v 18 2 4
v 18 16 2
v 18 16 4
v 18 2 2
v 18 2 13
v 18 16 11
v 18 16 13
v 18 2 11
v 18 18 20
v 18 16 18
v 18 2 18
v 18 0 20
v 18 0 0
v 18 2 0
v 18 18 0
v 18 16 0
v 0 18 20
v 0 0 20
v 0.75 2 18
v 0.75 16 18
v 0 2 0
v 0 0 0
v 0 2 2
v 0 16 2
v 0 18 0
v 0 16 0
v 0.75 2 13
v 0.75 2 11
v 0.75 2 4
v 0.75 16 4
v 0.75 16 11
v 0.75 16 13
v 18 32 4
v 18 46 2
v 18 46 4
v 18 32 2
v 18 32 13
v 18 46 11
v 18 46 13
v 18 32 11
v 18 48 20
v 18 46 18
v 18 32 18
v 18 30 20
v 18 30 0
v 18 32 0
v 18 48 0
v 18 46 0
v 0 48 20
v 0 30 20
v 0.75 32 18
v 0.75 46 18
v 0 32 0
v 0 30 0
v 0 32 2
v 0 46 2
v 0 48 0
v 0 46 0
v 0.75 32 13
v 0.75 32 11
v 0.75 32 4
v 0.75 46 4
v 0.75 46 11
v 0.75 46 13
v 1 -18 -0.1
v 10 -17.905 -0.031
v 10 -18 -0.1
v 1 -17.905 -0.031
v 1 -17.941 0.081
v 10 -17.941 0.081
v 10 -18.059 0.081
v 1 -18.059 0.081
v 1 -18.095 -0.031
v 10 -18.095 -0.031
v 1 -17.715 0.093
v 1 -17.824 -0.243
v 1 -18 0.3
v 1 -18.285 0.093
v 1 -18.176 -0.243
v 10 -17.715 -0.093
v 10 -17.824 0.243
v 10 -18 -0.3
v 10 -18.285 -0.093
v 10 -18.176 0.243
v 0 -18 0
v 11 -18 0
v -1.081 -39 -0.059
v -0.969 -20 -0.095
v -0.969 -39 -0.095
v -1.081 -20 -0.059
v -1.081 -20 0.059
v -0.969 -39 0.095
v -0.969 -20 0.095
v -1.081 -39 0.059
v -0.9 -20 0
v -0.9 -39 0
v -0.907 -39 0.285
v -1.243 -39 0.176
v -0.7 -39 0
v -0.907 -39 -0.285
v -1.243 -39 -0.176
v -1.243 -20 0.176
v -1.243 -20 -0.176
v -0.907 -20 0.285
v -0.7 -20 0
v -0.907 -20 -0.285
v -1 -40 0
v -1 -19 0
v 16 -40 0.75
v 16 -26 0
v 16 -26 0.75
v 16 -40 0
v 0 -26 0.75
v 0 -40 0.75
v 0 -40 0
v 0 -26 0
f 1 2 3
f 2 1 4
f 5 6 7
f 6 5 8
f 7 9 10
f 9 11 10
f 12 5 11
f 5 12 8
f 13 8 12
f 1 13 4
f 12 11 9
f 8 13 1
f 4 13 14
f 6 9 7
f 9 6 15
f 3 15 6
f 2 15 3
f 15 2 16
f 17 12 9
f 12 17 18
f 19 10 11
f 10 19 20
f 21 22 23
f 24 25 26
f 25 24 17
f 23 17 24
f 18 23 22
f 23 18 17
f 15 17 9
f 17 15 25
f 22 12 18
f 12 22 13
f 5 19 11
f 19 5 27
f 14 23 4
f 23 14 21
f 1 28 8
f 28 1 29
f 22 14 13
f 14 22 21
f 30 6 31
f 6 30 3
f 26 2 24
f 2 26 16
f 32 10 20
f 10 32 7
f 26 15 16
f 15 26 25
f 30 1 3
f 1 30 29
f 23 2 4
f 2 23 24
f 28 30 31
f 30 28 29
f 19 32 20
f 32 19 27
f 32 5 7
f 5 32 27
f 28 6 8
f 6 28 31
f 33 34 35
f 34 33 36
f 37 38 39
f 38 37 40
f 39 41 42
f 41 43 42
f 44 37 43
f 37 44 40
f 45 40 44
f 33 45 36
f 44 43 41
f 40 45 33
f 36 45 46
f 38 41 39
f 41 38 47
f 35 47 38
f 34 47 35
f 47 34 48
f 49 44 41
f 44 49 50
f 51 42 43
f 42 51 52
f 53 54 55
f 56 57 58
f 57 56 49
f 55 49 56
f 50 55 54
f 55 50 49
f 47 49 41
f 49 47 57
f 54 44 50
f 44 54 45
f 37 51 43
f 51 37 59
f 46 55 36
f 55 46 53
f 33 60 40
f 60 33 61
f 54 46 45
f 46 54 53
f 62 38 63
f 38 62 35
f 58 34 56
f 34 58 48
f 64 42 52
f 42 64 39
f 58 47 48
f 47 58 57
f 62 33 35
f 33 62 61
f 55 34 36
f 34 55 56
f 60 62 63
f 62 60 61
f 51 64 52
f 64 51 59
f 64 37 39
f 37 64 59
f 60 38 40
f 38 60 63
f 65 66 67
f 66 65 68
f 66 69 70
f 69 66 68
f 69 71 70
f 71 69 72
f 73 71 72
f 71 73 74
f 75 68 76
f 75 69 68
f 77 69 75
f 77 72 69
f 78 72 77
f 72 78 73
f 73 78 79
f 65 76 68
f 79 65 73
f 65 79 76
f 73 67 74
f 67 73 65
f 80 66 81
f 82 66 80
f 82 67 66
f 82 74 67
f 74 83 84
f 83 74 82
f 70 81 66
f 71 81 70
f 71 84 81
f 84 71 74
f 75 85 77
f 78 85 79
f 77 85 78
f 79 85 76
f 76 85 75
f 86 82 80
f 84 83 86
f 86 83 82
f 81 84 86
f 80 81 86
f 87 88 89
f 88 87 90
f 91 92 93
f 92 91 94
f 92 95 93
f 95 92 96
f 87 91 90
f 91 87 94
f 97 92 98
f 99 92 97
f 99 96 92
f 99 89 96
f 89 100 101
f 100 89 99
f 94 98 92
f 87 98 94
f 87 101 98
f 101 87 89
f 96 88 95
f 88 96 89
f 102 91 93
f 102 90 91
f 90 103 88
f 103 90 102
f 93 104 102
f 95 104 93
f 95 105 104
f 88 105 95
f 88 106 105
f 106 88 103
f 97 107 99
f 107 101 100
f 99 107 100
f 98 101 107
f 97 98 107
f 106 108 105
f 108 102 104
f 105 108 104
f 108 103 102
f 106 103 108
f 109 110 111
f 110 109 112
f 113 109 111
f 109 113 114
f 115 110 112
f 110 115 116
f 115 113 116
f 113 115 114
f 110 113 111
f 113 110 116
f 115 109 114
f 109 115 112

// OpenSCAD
// file: ../lib/common.scad
//--------------------------------------------------------------------------------------------------
// Module Prism
//--------------------------------------------------------------------------------------------------
module prism(z, y, x)
{
    rotate([0, 90, 0])
    {
        polyhedron(
                points=[[0,0,0], [x,0,0], [x,y,0], [0,y,0], [0,y,z], [x,y,z]],
                faces=[[0,1,2,3],[5,4,3,2],[0,4,5,1],[0,3,4],[5,2,1]]);
    }
    
}

//--------------------------------------------------------------------------------------------------
// Module Side panel
//--------------------------------------------------------------------------------------------------
module rect_cut(x, y, z, dx, dy)
{
    // Top panel
    translate([0, dy, 0])
    {
        cube([x, y - dy, z]);
    };

    // Left bottom panel
    translate([0, 0, 0])
    {
        cube([dx, dy, z]);
    };

    // Triangle
    translate([dx, 0, 0])
    {
        rotate([0, 0, 0])
        {
            prism(x - dx, dy, -z);
        }
    };
}

//--------------------------------------------------------------------------------------------------
// X dimensional arrow
//--------------------------------------------------------------------------------------------------
module arrow_x(l)
{
    line_w = 0.1;
    arrow_w = 1;
    arrow_h = 0.3;

    // Line
    translate([l / 2, 0, 0])
    {
        rotate([0, 90, 0])
        {
            color([0.4, 0.4, 0.4])
            cylinder(l - arrow_w * 2, line_w, line_w, true);
        }
    }

    // Left arrow
    translate([arrow_w, 0, 0])
    {
        rotate([0, 270, 0])
        {
            color([0.4, 0.4, 0.4])
            cylinder(arrow_w, arrow_h, 0, false);
        }
    }

    // Right arrow
    translate([l - arrow_w, 0, 0])
    {
        rotate([0, 90, 0])
        {
            color([0.4, 0.4, 0.4])
            cylinder(arrow_w, arrow_h, 0, false);
        }
    }

    // Text
    translate([l/3, 0.5, 0])
    {
        color([0.4, 0.4, 0.4])
        text(str(l), size=1);
    }
}

//--------------------------------------------------------------------------------------------------
// Y dimensional arrow
//--------------------------------------------------------------------------------------------------
module arrow_y(l)
{
    line_w = 0.1;
    arrow_w = 1;
    arrow_h = 0.3;

    // Line
    translate([0, l / 2, 0])
    {
        rotate([90, 0, 00])
        {
            color([0.4, 0.4, 0.4])
            cylinder(l - arrow_w * 2, line_w, line_w, true);
        }
    }

    // Left arrow
    translate([0 ,arrow_w, 0])
    {
        rotate([90, 0, 0])
        {
            color([0.4, 0.4, 0.4])
            cylinder(arrow_w, arrow_h, 0, false);
        }
    }

    // Right arrow
    translate([0, l - arrow_w, 0])
    {
        rotate([270, 0, 0])
        {
            color([0.4, 0.4, 0.4])
            cylinder(arrow_w, arrow_h, 0, false);
        }
    }

    // Text
    translate([-0.5, l/3, 0])
    {
        rotate([0 ,0, 90])
        {
            color([0.4, 0.4, 0.4])
            text(str(l), size=1);
        }
    }
}

//--------------------------------------------------------------------------------------------------
// parallelogram
//--------------------------------------------------------------------------------------------------
module parallelogram(x = 12, y = 12, z = 1, xd = 0)
{
    points = [
        [0, 0, 0 ],        //0
        [x, 0, 0 ],        //1
        [x + xd, y, 0],    //2
        [xd, y, 0 ],       //3
        [0, 0, z ],        //4
        [x, 0, z ],        //5
        [x + xd, y, z ],   //6
        [xd, y, z ]];      //7

    faces = [
        [0,1,2,3],         // bottom
        [4,5,1,0],         // front
        [7,6,5,4],         // top
        [5,6,2,1],         // right
        [6,7,3,2],         // back
        [7,4,0,3]];        // left

    polyhedron(points, faces);
}
// main file
include <../lib/common.scad>

//--------------------------------------------------------------------------------------------------
module top_board()
{
    color([0, 0, 1])
    cube([18, 18, 2]);
}

//--------------------------------------------------------------------------------------------------
module back_panel()
{
    color([1, 0, 0])
    cube([16, 14, 0.75]);
}

//--------------------------------------------------------------------------------------------------
module side_panel()
{
    color([0, 1, 0])
    cube([18, 18, 2]);
}

//--------------------------------------------------------------------------------------------------
module mid_panel()
{
    color([0, 1, 1])
    cube([17.25, 14, 2]);
}

//--------------------------------------------------------------------------------------------------
// Render
//--------------------------------------------------------------------------------------------------
translate([0, 0, 0])
{
    //----------------------------------------------------------------------------------------------
    // Top board
    //----------------------------------------------------------------------------------------------
    translate([0, 0, 18])
    {
        rotate([0, 0, 0])
        {
            top_board();
        }
    };

    //----------------------------------------------------------------------------------------------
    // Left panel
    //----------------------------------------------------------------------------------------------
    translate([0, 2, 0])
    {
        rotate([90, 0, 0])
        {
            side_panel();
        }
    };

    //----------------------------------------------------------------------------------------------
    // Right panel
    //----------------------------------------------------------------------------------------------
    translate([0, 18, 0])
    {
        rotate([90, 0, 0])
        {
            side_panel();
        }
    };

    //----------------------------------------------------------------------------------------------
    // Mid panel
    //----------------------------------------------------------------------------------------------
    translate([0.75, 2, 2])
    {
        rotate([0, 0, 0])
        {
            mid_panel();
        }
    };

    //----------------------------------------------------------------------------------------------
    // Mid panel
    //----------------------------------------------------------------------------------------------
    translate([0.75, 2, 11])
    {
        rotate([0, 0, 0])
        {
            mid_panel();
        }
    };

    //----------------------------------------------------------------------------------------------
    // Back panel
    //----------------------------------------------------------------------------------------------
    translate([0, 2, 18])
    {
        rotate([0, 90, 0])
        {
            back_panel();
        }
    };
}

//--------------------------------------------------------------------------------------------------
// Render
//--------------------------------------------------------------------------------------------------
translate([0, 30, 0])
{
    //----------------------------------------------------------------------------------------------
    // Top board
    //----------------------------------------------------------------------------------------------
    translate([0, 0, 18])
    {
        rotate([0, 0, 0])
        {
            top_board();
        }
    };

    //----------------------------------------------------------------------------------------------
    // Left panel
    //----------------------------------------------------------------------------------------------
    translate([0, 2, 0])
    {
        rotate([90, 0, 0])
        {
            side_panel();
        }
    };

    //----------------------------------------------------------------------------------------------
    // Right panel
    //----------------------------------------------------------------------------------------------
    translate([0, 18, 0])
    {
        rotate([90, 0, 0])
        {
            side_panel();
        }
    };

    //----------------------------------------------------------------------------------------------
    // Mid panel
    //----------------------------------------------------------------------------------------------
    translate([0.75, 2, 2])
    {
        rotate([0, 0, 0])
        {
            mid_panel();
        }
    };

    //----------------------------------------------------------------------------------------------
    // Mid panel
    //----------------------------------------------------------------------------------------------
    translate([0.75, 2, 11])
    {
        rotate([0, 0, 0])
        {
            mid_panel();
        }
    };

    //----------------------------------------------------------------------------------------------
    // Back panel
    //----------------------------------------------------------------------------------------------
    translate([0, 2, 18])
    {
        rotate([0, 90, 0])
        {
            back_panel();
        }
    };
}


//--------------------------------------------------------------------------------------------------
// Draw Parts
//--------------------------------------------------------------------------------------------------
translate([0, -40, 0])
{
    //----------------------------------------------------------------------------------------------
    // Back panel
    //----------------------------------------------------------------------------------------------
    translate([0, 0, 0])
    {
        back_panel();

        translate([0, 22, 0])
        {
            arrow_x(11);
        };

        translate([-1, 0, 0])
        {
            arrow_y(21);
        };
    };
}
